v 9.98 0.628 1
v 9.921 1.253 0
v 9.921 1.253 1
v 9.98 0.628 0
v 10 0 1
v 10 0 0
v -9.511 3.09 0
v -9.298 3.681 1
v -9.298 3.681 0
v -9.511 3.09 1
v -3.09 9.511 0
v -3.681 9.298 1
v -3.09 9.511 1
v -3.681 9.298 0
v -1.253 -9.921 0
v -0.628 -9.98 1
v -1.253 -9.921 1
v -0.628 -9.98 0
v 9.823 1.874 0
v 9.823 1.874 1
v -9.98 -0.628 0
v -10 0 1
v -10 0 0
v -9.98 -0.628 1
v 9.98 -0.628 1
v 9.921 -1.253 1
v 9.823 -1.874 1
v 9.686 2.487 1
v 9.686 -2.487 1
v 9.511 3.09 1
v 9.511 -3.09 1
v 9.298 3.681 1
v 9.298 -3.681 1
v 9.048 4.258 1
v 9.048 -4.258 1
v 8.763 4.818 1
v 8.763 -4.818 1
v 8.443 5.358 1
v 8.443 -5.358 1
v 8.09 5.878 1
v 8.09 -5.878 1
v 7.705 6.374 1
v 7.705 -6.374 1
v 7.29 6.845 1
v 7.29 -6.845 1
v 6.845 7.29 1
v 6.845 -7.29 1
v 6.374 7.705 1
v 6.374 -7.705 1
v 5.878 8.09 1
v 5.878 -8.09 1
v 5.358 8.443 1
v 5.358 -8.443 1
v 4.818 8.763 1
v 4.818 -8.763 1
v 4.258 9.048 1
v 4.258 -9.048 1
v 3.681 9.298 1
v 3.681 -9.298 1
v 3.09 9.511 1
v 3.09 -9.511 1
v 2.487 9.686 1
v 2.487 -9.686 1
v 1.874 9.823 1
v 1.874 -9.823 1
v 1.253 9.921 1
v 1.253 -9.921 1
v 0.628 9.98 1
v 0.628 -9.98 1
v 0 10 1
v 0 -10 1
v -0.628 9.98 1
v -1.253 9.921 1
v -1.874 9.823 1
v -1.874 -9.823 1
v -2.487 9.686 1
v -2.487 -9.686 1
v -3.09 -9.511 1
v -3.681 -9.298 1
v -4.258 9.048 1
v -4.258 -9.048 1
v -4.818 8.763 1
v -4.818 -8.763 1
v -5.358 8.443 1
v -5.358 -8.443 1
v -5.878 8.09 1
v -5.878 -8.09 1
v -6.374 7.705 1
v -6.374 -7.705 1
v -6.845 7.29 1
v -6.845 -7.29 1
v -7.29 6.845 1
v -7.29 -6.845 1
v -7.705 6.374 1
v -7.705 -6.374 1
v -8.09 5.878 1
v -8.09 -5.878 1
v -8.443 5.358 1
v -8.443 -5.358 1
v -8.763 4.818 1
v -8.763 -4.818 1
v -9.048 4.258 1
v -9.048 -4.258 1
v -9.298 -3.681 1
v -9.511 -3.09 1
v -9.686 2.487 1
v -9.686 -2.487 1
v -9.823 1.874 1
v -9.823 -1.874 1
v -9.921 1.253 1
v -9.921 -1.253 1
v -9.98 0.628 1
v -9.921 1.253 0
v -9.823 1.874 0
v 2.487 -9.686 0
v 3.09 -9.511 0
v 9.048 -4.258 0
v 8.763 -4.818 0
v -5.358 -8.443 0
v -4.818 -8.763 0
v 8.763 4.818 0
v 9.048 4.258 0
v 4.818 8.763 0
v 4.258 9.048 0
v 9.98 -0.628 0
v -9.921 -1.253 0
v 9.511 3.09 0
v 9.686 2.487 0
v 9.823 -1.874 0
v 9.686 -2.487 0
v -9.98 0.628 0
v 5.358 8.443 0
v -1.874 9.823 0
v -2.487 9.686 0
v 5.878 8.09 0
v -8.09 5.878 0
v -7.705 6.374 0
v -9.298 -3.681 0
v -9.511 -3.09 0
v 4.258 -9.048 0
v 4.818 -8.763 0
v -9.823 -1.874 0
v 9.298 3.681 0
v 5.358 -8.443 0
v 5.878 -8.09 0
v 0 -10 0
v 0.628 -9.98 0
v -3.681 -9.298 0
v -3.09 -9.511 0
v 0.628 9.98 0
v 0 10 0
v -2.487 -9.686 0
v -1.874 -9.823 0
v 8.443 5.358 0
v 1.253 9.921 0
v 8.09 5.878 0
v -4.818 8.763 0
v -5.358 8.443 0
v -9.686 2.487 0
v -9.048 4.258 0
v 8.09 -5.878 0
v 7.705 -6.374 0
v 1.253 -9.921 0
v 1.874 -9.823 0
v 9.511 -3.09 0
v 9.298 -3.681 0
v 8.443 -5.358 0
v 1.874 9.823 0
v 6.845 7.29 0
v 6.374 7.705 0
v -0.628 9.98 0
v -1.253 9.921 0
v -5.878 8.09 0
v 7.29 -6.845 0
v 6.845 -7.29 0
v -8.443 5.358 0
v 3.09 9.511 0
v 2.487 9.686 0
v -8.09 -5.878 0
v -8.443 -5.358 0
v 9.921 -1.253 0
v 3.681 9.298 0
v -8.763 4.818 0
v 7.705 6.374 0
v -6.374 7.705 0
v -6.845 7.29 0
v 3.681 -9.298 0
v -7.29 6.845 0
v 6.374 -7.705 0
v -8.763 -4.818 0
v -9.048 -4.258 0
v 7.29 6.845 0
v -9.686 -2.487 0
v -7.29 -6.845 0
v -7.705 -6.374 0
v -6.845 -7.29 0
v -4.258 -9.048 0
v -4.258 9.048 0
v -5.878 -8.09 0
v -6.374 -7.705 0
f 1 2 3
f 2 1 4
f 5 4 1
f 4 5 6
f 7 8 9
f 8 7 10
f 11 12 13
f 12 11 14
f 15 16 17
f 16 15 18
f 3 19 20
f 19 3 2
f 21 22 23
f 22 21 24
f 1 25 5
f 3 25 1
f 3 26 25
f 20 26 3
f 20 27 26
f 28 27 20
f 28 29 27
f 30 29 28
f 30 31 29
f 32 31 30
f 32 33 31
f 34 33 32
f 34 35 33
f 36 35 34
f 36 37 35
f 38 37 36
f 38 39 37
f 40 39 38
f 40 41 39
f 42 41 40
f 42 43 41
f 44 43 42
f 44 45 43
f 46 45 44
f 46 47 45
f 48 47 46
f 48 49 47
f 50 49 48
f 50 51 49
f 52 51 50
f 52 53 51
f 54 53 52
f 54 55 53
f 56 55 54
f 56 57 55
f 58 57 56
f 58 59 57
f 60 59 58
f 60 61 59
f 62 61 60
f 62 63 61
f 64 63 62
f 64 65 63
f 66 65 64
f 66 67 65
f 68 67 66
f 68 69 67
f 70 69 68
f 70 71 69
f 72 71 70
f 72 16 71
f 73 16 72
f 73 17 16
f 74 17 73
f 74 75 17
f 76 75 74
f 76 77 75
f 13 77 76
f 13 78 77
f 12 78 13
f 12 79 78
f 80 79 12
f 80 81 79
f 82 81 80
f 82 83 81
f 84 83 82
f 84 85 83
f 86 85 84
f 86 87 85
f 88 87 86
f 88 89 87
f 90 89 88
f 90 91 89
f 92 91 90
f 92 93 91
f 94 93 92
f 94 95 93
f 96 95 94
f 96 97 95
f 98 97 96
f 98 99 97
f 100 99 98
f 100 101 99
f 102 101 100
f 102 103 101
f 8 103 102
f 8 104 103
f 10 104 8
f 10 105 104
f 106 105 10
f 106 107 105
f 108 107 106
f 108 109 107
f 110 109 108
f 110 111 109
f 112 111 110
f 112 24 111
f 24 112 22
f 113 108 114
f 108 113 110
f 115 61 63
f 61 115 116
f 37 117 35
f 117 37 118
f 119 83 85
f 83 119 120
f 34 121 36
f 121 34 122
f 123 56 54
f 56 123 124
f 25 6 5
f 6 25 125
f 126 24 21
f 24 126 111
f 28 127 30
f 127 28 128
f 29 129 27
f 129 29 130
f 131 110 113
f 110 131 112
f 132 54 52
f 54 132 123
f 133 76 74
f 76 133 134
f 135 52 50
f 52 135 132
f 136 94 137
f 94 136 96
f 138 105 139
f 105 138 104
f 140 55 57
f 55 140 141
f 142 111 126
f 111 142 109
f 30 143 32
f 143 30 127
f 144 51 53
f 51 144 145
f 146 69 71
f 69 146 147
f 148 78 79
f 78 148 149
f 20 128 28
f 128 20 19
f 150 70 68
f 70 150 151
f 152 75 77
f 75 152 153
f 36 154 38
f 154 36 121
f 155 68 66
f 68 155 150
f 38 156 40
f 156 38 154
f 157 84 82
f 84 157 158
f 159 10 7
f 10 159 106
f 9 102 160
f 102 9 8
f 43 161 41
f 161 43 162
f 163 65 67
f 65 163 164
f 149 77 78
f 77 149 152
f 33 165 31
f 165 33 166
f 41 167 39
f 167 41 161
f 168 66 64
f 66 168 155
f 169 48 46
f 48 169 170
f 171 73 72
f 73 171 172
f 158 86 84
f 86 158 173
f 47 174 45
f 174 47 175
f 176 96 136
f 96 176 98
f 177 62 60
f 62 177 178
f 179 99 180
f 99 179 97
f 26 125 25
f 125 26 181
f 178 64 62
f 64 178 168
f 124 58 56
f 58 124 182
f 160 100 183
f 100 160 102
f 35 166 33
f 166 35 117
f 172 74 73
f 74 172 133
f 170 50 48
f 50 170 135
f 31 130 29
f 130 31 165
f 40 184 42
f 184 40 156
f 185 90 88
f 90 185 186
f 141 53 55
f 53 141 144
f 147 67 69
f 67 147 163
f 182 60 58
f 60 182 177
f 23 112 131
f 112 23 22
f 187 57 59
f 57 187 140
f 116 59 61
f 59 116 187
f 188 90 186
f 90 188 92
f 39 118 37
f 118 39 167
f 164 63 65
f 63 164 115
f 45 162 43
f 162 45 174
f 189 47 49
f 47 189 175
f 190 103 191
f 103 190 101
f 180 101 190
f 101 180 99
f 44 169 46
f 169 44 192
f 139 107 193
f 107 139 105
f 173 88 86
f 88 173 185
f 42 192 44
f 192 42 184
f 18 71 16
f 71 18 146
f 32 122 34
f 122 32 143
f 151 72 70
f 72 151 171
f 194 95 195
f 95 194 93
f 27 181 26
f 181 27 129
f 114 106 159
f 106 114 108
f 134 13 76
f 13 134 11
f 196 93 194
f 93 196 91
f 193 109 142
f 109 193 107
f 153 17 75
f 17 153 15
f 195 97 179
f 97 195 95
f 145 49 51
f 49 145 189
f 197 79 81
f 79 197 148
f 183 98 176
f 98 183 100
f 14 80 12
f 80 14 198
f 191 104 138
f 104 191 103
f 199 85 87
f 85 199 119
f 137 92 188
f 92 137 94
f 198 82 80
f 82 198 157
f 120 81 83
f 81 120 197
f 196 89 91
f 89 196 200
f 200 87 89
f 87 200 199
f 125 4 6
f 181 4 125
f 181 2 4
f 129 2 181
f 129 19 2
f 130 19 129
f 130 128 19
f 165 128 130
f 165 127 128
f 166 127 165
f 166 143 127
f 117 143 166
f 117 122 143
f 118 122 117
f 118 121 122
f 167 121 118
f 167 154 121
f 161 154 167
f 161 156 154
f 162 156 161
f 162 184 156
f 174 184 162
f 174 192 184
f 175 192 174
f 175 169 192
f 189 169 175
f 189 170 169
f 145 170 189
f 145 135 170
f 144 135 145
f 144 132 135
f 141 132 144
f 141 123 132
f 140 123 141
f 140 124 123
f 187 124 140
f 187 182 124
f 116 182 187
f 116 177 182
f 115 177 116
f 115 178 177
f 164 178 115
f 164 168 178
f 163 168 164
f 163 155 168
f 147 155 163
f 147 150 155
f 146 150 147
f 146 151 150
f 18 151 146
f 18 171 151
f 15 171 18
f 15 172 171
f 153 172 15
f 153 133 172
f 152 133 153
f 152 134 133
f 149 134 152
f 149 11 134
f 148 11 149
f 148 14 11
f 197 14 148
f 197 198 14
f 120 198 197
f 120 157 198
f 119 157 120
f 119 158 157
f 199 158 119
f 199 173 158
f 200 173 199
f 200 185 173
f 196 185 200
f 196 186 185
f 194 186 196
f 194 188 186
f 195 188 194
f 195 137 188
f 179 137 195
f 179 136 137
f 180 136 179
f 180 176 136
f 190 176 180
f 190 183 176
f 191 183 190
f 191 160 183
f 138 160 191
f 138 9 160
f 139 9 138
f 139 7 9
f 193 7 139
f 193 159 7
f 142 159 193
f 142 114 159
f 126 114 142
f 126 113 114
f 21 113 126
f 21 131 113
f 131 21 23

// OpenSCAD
//Changes the "roundness"
$fn=100;

//First line text
line1="Top";
//Font size of first line
size1=2;
//Offset of first line
off1=4;
//Second line text
line2="Bottom";
//Font size of second line
size2=2;
//Offset of second line
off2=-4;

//Ignore all of this, this is what generates the token
difference() {
    cylinder(r=10,h=1);

    translate([0,off1,1]){
        text(line1,size=size1,halign="center",valign="center");
    }
    translate([0,off2,1]) {
        text(line2,size=size2,halign="center",valign="center");
    }
}
